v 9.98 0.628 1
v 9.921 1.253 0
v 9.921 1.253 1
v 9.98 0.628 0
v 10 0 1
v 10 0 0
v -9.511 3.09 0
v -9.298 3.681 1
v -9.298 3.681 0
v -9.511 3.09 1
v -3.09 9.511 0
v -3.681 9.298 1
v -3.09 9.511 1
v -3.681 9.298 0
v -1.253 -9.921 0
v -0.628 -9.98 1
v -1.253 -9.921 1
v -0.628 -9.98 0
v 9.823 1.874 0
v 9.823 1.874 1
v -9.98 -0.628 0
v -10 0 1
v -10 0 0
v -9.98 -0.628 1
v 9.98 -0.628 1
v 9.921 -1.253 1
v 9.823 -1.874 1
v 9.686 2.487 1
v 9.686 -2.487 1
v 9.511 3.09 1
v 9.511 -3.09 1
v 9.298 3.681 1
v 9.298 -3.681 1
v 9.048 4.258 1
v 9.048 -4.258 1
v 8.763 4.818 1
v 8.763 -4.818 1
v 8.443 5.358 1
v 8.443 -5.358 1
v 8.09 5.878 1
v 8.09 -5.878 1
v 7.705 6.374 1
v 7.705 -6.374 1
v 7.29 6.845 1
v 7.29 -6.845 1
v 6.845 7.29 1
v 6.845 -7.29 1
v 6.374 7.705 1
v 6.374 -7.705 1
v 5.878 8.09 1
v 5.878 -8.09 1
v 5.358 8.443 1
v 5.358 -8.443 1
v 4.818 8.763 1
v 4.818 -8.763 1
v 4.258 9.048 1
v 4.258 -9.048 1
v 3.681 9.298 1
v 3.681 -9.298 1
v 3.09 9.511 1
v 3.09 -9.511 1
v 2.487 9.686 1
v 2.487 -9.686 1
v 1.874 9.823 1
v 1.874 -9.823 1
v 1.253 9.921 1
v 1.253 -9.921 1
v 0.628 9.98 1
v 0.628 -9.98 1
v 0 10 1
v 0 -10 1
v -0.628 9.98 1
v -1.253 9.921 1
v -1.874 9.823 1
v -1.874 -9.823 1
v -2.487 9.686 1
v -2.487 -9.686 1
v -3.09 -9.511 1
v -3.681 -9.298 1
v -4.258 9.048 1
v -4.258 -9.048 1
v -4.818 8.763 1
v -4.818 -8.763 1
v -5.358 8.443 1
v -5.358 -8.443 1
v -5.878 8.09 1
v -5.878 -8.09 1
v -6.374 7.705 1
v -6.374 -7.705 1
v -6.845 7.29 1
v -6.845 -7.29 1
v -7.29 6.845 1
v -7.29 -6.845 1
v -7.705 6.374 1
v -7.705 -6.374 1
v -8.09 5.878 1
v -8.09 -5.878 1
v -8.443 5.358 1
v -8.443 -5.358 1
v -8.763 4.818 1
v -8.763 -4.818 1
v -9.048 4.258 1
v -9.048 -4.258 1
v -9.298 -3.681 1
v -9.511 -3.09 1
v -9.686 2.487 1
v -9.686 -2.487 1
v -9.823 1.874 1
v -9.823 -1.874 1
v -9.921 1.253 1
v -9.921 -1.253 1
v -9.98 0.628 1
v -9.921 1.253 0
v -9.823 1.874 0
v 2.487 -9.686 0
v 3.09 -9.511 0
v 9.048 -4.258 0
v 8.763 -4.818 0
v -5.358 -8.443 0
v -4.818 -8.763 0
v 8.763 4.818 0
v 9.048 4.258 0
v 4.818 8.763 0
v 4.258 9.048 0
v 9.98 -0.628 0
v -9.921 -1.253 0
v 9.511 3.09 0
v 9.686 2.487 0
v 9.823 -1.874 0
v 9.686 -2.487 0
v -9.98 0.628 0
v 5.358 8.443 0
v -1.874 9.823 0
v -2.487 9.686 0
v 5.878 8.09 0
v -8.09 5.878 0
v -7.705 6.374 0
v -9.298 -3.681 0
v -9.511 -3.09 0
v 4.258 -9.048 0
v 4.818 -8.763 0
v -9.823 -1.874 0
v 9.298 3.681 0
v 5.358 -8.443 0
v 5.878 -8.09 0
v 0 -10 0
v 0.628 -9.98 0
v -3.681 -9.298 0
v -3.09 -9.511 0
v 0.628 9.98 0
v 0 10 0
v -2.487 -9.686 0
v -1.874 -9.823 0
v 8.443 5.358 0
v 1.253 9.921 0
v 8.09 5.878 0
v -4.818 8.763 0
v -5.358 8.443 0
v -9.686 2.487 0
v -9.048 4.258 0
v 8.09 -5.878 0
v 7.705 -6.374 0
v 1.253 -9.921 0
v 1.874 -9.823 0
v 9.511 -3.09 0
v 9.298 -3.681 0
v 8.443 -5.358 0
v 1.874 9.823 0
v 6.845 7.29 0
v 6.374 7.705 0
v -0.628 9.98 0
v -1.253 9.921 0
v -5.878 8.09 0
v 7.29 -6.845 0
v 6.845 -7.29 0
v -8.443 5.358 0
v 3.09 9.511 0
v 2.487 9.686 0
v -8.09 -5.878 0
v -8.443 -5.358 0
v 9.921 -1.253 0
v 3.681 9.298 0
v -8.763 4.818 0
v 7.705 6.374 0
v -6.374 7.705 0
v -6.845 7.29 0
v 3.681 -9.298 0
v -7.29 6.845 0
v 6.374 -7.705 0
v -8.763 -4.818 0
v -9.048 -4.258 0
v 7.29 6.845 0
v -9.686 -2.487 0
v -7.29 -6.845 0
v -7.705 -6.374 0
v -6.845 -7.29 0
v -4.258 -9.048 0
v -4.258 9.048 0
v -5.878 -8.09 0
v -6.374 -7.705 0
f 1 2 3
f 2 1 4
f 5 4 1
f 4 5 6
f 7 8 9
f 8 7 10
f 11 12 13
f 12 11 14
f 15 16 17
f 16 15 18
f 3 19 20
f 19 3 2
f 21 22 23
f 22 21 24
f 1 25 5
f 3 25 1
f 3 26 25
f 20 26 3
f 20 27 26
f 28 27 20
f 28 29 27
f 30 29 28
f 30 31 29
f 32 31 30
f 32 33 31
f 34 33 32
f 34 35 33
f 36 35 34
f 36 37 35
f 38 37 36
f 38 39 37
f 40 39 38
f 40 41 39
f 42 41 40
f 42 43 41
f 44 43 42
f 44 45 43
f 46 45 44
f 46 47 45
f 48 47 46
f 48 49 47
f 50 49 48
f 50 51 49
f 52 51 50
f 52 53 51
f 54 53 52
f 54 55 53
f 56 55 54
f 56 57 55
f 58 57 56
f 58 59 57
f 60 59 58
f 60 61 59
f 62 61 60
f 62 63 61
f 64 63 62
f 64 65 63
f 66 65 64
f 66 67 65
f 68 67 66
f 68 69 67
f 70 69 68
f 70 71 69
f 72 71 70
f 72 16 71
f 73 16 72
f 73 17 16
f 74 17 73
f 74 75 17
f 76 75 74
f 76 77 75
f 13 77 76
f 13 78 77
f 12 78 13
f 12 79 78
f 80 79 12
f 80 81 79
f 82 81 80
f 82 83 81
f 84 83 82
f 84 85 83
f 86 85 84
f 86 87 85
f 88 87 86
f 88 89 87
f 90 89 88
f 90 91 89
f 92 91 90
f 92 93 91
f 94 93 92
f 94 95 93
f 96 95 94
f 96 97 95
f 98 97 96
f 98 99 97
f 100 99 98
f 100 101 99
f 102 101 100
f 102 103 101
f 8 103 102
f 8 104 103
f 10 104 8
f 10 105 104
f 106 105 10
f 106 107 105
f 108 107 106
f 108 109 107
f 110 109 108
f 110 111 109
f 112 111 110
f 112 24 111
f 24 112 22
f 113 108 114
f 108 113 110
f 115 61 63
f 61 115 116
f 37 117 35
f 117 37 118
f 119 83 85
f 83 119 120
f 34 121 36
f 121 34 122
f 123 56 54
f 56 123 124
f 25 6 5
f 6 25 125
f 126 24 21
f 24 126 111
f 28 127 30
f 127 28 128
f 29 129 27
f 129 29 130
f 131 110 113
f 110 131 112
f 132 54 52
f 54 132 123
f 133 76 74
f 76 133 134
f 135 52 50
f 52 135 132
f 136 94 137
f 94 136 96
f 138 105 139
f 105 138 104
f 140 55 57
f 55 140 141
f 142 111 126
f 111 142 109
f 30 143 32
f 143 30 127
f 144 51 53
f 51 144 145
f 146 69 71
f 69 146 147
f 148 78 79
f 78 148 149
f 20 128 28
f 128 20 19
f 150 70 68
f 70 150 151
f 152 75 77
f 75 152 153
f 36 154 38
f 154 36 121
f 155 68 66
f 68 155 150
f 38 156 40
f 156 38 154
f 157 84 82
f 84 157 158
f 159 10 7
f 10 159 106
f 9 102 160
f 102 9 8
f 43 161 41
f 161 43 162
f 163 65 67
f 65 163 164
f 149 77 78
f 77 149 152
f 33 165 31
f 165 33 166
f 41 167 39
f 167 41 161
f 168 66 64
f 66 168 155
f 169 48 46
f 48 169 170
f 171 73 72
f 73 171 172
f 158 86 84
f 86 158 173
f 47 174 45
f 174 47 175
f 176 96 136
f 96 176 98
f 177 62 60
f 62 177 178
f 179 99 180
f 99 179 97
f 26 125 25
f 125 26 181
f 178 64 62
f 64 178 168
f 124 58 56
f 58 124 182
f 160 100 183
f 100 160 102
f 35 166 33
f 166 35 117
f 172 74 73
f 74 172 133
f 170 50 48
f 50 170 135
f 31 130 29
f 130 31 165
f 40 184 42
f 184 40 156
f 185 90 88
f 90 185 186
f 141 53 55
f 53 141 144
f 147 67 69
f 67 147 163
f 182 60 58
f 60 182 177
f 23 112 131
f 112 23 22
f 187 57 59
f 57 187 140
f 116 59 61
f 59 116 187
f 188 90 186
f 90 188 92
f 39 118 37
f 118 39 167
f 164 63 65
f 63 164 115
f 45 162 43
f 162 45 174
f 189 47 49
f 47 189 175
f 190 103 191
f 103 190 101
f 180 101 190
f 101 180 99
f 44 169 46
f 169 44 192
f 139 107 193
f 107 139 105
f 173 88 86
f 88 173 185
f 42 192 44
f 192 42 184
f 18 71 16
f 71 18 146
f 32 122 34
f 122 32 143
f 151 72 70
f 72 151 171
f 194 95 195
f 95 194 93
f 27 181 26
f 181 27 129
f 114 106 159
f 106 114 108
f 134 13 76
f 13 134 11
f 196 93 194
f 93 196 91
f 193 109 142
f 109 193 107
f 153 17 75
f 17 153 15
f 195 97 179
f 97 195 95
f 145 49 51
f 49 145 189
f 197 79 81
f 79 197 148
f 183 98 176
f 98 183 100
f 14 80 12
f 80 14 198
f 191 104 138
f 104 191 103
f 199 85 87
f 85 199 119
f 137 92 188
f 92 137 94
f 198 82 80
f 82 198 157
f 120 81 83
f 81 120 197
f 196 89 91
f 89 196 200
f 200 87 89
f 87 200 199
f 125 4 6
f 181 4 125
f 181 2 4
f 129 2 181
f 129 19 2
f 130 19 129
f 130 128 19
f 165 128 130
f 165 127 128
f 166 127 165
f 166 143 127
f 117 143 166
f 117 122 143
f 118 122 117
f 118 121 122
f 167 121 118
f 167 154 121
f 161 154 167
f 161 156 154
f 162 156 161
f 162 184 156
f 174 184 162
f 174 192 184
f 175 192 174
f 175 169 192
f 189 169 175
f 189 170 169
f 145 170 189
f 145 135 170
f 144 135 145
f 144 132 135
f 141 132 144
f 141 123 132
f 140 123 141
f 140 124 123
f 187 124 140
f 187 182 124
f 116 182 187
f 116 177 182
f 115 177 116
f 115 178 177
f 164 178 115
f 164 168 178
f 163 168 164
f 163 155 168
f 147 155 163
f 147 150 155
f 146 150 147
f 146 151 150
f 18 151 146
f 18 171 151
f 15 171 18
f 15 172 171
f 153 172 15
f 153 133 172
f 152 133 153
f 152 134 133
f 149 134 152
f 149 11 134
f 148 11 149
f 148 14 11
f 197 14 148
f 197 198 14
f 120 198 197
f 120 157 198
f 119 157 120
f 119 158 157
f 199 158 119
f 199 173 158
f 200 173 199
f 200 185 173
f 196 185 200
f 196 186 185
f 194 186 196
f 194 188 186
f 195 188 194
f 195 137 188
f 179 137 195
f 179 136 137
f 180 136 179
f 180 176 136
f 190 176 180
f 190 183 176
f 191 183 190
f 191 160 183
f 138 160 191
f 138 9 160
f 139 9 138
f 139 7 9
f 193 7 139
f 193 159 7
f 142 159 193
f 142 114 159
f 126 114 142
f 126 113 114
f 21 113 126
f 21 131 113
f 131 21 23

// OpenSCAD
//Changes the "roundness"
$fn=100;

//First line text
line1="Top";
//Font size of first line
size1=2;
//Offset of first line
off1=4;
//Second line text
line2="Bottom";
//Font size of second line
size2=2;
//Offset of second line
off2=-4;

//Ignore all of this, this is what generates the token
difference() {
    cylinder(r=10,h=1);

    translate([0,off1,1]){
        text(line1,size=size1,halign="center",valign="center");
    }
    translate([0,off2,1]) {
        text(line2,size=size2,halign="center",valign="center");
    }
}
